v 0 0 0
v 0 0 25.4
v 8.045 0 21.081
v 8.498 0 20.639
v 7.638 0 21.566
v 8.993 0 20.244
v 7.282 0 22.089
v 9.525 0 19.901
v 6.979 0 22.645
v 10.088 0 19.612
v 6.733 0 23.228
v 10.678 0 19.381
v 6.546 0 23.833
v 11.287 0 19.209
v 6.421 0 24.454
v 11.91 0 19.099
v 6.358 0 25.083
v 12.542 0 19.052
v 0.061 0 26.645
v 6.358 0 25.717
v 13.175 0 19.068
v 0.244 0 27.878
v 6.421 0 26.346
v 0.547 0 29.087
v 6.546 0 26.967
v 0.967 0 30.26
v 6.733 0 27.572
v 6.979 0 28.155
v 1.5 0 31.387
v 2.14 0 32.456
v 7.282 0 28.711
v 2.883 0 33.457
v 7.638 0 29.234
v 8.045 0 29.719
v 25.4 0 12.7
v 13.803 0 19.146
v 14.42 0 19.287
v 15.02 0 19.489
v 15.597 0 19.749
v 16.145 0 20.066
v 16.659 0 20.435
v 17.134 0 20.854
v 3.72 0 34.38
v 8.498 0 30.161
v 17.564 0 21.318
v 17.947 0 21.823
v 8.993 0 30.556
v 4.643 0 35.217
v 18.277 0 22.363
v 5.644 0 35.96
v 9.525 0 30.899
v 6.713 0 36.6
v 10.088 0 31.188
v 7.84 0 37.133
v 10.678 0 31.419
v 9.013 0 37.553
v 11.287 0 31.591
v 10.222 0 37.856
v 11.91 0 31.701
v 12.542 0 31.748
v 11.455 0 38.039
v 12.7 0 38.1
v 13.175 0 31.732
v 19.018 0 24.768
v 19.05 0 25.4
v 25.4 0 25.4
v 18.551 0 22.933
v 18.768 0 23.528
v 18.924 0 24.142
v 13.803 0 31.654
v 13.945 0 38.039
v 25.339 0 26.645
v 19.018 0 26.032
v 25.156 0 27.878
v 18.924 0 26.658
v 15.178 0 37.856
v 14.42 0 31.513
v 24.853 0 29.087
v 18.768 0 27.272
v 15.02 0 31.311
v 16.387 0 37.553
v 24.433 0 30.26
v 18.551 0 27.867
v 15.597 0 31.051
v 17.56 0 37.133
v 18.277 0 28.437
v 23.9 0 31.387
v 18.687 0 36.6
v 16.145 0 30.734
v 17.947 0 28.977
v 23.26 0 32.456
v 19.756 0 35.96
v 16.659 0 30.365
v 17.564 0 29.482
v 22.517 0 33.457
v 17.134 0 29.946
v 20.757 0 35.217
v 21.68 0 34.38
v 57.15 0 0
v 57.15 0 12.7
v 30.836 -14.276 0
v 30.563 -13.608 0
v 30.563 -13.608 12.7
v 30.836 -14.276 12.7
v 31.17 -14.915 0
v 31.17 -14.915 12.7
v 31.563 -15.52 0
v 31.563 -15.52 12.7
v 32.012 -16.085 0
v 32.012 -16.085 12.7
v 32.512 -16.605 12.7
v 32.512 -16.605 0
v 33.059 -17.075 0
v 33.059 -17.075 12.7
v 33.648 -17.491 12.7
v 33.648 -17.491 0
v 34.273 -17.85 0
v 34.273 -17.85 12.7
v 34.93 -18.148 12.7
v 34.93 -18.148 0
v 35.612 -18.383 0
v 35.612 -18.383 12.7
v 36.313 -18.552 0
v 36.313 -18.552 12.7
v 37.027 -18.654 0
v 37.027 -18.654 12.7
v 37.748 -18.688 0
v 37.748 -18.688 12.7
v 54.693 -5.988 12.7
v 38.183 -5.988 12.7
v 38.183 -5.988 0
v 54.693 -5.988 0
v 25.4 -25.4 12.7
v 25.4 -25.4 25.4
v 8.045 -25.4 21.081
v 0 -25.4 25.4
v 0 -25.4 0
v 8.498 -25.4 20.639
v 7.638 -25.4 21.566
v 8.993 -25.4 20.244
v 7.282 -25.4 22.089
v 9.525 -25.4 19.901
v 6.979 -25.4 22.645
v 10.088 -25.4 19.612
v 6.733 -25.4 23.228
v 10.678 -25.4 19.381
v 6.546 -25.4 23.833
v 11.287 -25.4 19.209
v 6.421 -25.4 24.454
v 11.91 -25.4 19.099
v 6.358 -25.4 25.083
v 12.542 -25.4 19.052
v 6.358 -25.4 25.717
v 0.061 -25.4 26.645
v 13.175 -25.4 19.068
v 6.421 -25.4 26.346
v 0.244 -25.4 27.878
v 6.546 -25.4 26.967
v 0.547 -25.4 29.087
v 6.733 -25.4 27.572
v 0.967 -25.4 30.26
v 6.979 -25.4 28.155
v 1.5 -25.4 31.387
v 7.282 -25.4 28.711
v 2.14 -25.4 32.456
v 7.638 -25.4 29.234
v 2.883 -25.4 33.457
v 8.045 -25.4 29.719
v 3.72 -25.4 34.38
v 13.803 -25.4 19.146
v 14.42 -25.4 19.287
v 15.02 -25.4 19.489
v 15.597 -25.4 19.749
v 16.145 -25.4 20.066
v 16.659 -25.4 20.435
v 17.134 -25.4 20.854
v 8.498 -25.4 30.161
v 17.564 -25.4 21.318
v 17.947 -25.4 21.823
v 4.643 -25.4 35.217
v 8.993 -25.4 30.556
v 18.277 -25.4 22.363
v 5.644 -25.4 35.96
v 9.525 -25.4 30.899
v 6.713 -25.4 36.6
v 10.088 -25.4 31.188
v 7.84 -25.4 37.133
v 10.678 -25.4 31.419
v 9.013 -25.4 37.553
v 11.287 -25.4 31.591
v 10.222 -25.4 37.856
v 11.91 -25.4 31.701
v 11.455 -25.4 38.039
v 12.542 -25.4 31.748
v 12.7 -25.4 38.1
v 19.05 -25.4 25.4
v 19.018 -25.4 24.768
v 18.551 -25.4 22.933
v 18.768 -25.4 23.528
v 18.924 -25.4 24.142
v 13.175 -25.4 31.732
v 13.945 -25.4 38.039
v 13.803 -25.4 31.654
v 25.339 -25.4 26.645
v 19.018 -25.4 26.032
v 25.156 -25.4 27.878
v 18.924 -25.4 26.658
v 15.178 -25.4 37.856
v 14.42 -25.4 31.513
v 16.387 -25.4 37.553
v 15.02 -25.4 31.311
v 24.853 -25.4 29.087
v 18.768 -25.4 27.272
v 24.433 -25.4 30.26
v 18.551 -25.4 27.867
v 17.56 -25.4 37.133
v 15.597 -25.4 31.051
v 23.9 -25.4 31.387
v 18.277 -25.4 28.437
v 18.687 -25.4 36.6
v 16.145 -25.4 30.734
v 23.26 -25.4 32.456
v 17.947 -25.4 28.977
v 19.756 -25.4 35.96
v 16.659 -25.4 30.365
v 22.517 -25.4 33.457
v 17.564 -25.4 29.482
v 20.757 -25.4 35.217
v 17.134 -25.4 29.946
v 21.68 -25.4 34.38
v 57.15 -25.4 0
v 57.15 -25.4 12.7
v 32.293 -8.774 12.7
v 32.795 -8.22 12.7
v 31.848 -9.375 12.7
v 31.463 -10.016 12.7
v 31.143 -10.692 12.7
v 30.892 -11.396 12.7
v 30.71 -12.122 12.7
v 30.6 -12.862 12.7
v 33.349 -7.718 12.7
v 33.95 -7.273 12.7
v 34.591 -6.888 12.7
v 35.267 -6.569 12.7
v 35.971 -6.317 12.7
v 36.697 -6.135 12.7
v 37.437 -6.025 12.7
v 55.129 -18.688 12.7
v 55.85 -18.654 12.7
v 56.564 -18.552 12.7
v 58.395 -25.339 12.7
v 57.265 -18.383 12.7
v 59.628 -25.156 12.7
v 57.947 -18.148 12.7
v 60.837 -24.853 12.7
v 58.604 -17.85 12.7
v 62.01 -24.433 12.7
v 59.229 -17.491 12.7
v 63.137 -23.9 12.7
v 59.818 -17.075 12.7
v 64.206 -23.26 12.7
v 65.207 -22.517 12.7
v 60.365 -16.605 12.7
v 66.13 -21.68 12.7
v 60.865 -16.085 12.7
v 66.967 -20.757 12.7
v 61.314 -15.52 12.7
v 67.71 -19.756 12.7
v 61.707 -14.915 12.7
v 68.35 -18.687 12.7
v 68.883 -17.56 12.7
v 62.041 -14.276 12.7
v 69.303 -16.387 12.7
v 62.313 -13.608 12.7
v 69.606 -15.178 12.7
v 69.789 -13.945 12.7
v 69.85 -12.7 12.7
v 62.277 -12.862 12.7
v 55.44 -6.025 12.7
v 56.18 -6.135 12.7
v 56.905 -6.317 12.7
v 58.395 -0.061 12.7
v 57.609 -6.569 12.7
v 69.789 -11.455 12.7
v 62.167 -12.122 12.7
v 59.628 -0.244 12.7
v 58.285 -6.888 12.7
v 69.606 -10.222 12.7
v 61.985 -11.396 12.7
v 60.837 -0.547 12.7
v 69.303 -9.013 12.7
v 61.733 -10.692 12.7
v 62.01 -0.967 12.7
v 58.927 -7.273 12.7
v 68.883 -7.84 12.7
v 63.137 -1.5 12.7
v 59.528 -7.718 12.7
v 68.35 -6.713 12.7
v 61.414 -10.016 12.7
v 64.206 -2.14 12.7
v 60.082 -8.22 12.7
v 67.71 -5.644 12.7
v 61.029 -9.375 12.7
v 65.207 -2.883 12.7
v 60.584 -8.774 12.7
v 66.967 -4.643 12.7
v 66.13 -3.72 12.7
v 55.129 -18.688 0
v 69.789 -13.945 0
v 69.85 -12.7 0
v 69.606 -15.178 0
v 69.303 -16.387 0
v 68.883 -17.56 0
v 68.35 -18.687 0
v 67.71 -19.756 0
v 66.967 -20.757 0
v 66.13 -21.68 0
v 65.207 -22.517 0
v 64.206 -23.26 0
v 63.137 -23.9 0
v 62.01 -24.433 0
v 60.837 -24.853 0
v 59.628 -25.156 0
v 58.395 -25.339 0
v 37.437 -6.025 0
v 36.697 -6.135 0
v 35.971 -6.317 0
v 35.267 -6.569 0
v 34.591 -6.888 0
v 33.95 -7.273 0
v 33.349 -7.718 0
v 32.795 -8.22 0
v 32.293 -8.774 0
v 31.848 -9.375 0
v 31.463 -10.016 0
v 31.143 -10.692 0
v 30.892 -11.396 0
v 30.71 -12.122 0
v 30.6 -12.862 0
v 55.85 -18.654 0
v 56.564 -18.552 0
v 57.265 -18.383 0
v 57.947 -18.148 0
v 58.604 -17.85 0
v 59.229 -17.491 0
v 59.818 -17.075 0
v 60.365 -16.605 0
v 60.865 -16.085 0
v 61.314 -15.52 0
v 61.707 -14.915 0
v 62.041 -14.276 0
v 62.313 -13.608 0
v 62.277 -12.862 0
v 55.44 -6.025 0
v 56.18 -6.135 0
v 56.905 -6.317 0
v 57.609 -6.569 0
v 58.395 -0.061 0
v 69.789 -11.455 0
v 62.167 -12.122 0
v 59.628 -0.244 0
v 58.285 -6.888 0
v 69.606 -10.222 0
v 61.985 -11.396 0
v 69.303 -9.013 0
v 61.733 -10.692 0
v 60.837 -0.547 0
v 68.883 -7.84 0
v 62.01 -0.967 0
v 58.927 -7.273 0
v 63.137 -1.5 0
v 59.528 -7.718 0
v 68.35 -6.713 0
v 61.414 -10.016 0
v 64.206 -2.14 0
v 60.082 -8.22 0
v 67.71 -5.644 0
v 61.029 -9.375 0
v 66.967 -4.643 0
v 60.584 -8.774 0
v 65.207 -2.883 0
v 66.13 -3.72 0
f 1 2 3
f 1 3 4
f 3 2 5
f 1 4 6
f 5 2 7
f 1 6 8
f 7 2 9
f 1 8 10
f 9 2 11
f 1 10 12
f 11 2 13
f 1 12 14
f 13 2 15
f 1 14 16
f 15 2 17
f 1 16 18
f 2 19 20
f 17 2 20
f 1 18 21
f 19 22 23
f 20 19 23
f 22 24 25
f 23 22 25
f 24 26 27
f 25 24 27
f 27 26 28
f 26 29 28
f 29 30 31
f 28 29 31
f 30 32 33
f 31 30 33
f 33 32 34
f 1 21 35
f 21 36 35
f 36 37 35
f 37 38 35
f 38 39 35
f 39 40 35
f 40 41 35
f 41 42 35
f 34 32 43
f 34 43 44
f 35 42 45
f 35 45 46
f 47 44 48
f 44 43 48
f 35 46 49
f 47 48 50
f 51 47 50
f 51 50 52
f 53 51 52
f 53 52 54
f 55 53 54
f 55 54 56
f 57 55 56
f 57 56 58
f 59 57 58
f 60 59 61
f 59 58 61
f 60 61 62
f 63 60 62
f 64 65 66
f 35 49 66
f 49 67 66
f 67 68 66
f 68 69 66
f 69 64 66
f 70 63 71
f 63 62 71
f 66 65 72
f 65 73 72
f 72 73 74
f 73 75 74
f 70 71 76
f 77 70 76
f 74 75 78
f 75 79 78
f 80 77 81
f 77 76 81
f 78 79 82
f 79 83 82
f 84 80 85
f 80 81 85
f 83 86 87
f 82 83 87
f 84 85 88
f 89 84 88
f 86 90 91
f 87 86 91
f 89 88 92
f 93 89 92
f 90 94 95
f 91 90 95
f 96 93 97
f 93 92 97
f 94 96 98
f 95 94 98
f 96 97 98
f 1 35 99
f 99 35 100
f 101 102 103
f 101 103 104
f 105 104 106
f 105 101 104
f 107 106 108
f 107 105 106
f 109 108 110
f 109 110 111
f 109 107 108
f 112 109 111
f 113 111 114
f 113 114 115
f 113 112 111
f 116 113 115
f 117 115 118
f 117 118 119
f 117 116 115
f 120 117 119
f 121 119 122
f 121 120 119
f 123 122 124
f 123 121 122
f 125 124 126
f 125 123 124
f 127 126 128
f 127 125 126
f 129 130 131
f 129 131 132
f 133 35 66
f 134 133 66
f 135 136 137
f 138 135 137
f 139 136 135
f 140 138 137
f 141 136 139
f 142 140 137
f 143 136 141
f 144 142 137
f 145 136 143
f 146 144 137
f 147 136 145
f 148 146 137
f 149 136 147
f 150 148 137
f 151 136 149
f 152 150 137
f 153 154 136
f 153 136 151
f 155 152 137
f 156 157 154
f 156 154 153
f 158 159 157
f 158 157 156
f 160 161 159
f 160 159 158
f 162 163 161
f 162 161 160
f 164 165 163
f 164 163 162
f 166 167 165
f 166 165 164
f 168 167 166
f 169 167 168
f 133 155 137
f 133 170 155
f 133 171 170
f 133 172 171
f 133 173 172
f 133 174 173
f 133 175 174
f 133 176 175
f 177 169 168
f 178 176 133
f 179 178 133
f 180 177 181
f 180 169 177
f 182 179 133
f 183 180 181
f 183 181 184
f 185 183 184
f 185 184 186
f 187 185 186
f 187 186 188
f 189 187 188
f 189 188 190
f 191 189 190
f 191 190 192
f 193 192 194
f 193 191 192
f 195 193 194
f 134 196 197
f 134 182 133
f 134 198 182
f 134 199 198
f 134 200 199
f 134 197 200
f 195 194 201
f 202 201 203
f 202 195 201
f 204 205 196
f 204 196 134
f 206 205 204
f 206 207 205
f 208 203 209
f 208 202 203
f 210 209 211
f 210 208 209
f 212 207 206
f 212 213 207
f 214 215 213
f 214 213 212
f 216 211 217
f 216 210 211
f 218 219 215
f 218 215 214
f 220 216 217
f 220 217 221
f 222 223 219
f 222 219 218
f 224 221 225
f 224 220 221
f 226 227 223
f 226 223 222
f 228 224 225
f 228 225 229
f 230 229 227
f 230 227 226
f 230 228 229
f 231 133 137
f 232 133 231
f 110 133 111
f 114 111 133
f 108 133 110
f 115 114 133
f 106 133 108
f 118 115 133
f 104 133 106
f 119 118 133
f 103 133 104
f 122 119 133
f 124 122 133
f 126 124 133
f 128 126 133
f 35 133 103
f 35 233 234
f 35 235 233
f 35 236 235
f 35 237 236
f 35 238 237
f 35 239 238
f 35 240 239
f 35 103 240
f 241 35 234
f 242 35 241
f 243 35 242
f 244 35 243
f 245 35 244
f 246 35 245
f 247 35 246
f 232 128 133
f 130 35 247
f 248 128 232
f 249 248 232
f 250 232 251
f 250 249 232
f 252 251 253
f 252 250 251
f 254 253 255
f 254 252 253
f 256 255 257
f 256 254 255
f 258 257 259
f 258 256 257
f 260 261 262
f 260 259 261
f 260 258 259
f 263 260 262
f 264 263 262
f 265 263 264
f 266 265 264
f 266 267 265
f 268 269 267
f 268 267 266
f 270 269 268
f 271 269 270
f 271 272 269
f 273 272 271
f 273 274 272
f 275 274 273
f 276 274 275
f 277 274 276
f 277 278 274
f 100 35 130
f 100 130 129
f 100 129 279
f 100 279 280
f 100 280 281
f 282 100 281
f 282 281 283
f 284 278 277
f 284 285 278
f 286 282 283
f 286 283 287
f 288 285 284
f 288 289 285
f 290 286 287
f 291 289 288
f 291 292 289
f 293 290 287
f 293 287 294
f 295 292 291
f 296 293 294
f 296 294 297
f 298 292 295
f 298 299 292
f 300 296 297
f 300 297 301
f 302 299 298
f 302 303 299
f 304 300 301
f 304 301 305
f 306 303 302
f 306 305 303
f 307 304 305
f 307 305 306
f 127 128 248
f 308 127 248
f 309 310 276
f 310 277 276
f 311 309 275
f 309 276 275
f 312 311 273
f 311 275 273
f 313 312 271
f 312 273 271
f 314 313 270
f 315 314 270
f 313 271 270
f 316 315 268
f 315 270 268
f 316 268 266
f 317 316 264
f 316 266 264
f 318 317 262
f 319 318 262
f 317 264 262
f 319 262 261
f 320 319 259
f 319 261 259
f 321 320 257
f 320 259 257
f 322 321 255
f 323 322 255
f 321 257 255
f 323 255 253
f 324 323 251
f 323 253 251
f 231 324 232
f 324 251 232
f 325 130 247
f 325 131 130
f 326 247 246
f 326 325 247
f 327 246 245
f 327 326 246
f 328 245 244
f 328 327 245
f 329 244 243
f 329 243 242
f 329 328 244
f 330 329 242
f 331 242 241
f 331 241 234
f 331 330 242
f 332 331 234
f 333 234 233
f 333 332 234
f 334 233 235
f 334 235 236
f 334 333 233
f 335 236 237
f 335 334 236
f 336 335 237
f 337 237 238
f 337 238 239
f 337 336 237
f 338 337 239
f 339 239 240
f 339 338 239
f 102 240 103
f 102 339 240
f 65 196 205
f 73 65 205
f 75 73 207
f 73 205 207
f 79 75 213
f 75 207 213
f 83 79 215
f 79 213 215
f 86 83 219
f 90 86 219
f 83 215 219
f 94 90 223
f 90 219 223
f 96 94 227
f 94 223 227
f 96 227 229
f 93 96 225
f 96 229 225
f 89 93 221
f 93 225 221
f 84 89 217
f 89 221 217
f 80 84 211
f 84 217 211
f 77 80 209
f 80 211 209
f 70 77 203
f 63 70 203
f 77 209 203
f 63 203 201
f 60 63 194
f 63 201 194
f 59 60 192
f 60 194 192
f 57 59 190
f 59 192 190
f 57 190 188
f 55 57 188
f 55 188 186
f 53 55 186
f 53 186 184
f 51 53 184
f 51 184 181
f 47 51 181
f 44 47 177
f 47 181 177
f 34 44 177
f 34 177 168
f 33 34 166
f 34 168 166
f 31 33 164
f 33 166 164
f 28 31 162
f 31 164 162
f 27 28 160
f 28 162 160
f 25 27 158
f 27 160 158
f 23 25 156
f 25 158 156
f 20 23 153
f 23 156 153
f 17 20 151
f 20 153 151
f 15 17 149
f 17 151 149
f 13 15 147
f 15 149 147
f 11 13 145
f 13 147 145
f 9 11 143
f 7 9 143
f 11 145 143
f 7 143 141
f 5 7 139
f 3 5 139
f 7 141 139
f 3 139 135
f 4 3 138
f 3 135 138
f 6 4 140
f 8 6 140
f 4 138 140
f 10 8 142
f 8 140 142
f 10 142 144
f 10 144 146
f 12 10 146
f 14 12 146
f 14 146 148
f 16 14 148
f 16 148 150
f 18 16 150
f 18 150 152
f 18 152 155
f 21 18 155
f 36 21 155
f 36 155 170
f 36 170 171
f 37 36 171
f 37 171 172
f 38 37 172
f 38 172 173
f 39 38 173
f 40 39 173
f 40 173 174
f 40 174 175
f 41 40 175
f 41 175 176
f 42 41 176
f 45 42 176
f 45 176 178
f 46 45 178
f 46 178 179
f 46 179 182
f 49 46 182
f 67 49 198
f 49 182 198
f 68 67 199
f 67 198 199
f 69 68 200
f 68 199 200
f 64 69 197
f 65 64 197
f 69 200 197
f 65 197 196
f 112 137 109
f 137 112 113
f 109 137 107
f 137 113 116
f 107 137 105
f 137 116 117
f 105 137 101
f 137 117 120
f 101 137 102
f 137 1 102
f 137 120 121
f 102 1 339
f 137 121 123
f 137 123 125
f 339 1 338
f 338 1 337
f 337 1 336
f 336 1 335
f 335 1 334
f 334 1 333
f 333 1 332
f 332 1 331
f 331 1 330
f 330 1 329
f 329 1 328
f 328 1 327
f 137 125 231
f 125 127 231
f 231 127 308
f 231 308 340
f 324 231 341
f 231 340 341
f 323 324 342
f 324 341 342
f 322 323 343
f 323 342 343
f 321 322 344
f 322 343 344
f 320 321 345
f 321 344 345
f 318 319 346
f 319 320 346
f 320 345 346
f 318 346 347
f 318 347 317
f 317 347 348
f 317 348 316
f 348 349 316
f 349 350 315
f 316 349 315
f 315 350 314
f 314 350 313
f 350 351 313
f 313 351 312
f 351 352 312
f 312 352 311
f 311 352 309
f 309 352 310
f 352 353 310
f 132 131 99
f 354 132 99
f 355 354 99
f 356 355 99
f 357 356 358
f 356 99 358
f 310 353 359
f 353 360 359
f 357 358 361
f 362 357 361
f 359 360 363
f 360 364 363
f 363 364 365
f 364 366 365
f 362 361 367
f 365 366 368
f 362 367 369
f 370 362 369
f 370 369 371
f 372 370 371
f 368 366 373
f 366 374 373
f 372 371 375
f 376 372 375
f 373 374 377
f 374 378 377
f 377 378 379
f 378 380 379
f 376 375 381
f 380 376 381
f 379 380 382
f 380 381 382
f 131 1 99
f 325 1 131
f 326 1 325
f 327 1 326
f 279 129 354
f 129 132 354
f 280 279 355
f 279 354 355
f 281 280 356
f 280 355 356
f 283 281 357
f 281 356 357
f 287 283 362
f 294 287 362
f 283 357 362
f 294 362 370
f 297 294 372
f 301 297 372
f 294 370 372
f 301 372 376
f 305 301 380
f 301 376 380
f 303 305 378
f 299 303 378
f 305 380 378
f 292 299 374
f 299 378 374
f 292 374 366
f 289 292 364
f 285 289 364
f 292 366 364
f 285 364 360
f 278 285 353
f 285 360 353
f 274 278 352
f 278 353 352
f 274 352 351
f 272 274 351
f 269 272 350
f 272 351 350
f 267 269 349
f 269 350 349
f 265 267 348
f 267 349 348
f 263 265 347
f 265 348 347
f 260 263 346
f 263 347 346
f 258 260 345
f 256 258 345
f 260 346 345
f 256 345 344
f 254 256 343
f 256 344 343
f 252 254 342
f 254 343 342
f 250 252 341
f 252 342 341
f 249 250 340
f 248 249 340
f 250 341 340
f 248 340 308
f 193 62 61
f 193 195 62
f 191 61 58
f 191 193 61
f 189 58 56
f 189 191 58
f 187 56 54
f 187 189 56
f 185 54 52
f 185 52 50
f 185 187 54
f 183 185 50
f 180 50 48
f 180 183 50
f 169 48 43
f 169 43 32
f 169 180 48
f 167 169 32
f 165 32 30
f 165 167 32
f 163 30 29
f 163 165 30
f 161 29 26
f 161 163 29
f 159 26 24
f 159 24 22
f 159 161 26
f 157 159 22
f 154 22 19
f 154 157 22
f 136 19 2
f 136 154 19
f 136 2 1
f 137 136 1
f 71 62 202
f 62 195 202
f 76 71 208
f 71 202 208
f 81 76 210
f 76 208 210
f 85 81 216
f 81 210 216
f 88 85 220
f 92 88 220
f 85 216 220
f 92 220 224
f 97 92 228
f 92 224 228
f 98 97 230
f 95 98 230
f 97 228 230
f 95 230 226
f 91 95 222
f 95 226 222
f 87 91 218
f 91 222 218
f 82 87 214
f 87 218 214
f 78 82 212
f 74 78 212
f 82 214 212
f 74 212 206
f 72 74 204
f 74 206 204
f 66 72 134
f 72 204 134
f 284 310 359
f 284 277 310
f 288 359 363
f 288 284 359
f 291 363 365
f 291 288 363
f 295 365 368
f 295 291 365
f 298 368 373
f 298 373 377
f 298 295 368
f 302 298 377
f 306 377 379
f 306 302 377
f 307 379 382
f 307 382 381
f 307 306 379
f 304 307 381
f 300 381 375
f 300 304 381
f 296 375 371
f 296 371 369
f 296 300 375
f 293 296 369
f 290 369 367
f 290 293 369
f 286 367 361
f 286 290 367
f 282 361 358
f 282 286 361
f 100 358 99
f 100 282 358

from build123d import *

# Parameters (mm, degrees)
F1_DEPTH     = 25.4
F2_R         = 12.7
F3_R         = 12.69999
F4_R         = 12.7
F5_R         = 12.69999
F6_R         = 6.35
F7_DEPTH     = 25.4
F8_W         = 31.75
F8_H         = 12.7
F9_DEPTH     = 25.4
F10_R        = 7.62
F11_T1_DEPTH = 12.7
F12_R        = 7.62
F13_T1_DEPTH = 12.7


# Not quite as in the source:
# - a fillet or chamfer that OpenCascade refuses, or shapes differently, is made with other operations: its cross-section is extruded or revolved along the edge and cut away or added
# - a fillet or chamfer is up to 0.001 mm smaller than in the source, because OpenCascade refuses the exact size


with BuildPart() as f1:
    # F0 (on Front) → F1 (new body)
    with BuildSketch(Plane.XZ):
        Polygon((0, 38.1), (0, 0), (69.85, 0), (69.85, 12.7), (25.4, 12.7), (25.4, 38.1), align=None)
    extrude(amount=F1_DEPTH)

    # F2
    f2_edges = [f1.edges().sort_by_distance(p)[0] for p in [
        (69.85, -25.4, 6.35),
    ]]
    fillet(f2_edges, radius=F2_R)

    # F3 (radius 12.7 in the source; OpenCascade refuses exactly that, so slightly less here)
    f3_edges = [f1.edges().sort_by_distance(p)[0] for p in [
        (69.85, 0, 6.35),
    ]]
    fillet(f3_edges, radius=F3_R)

    # F4
    f4_edges = [f1.edges().sort_by_distance(p)[0] for p in [
        (25.4, -12.7, 38.1),
    ]]
    fillet(f4_edges, radius=F4_R)

    # F5 (radius 12.7 in the source; OpenCascade refuses exactly that, so slightly less here)
    f5_edges = [f1.edges().sort_by_distance(p)[0] for p in [
        (0, -12.7, 38.1),
    ]]
    fillet(f5_edges, radius=F5_R)

    # F6 (on face) → F7 (cut)
    with BuildSketch(Plane.XZ.offset(25.4)):
        with Locations((12.7, 25.4)):
            Circle(F6_R)
    extrude(amount=-F7_DEPTH, mode=Mode.SUBTRACT)

    # F8 (on face) → F9 (cut)
    with BuildSketch(Plane.XY.offset(12.7)):
        with Locations((46.4384327233, -12.3384663999)):
            Rectangle(F8_W, F8_H)
    extrude(amount=-F9_DEPTH, mode=Mode.SUBTRACT)

    # F10
    f10_edges = [f1.edges().sort_by_distance(p)[0] for p in [
        (30.563433, -5.988466, 6.35),
    ]]
    fillet(f10_edges, radius=F10_R)

    # F11: fillet of radius 7.62 on 1 edges, made by hand

    # F11_s2 → F11_t1 (join)
    with BuildSketch(Plane.XY):
        with BuildLine():
            ThreePointArc((30.5634327233, -13.6084663999), (33.3482285689, -17.2901703466), (37.7476376201, -18.6884663999))
            Line((37.7476376201, -18.6884663999), (30.5634327233, -18.6884663999))
            Line((30.5634327233, -18.6884663999), (30.5634327233, -13.6084663999))
        make_face()
    extrude(amount=F11_T1_DEPTH)

    # F12
    f12_edges = [f1.edges().sort_by_distance(p)[0] for p in [
        (62.313433, -5.988466, 6.35),
    ]]
    fillet(f12_edges, radius=F12_R)

    # F13: fillet of radius 7.62 on 1 edges, made by hand

    # F13_s2 → F13_t1 (join)
    with BuildSketch(Plane.XY):
        with BuildLine():
            ThreePointArc((62.3134327233, -13.6084663999), (59.5286368777, -17.2901703466), (55.1292278264, -18.6884663999))
            Line((55.1292278264, -18.6884663999), (62.3134327233, -18.6884663999))
            Line((62.3134327233, -18.6884663999), (62.3134327233, -13.6084663999))
        make_face()
    extrude(amount=F13_T1_DEPTH)


solid = f1.part
